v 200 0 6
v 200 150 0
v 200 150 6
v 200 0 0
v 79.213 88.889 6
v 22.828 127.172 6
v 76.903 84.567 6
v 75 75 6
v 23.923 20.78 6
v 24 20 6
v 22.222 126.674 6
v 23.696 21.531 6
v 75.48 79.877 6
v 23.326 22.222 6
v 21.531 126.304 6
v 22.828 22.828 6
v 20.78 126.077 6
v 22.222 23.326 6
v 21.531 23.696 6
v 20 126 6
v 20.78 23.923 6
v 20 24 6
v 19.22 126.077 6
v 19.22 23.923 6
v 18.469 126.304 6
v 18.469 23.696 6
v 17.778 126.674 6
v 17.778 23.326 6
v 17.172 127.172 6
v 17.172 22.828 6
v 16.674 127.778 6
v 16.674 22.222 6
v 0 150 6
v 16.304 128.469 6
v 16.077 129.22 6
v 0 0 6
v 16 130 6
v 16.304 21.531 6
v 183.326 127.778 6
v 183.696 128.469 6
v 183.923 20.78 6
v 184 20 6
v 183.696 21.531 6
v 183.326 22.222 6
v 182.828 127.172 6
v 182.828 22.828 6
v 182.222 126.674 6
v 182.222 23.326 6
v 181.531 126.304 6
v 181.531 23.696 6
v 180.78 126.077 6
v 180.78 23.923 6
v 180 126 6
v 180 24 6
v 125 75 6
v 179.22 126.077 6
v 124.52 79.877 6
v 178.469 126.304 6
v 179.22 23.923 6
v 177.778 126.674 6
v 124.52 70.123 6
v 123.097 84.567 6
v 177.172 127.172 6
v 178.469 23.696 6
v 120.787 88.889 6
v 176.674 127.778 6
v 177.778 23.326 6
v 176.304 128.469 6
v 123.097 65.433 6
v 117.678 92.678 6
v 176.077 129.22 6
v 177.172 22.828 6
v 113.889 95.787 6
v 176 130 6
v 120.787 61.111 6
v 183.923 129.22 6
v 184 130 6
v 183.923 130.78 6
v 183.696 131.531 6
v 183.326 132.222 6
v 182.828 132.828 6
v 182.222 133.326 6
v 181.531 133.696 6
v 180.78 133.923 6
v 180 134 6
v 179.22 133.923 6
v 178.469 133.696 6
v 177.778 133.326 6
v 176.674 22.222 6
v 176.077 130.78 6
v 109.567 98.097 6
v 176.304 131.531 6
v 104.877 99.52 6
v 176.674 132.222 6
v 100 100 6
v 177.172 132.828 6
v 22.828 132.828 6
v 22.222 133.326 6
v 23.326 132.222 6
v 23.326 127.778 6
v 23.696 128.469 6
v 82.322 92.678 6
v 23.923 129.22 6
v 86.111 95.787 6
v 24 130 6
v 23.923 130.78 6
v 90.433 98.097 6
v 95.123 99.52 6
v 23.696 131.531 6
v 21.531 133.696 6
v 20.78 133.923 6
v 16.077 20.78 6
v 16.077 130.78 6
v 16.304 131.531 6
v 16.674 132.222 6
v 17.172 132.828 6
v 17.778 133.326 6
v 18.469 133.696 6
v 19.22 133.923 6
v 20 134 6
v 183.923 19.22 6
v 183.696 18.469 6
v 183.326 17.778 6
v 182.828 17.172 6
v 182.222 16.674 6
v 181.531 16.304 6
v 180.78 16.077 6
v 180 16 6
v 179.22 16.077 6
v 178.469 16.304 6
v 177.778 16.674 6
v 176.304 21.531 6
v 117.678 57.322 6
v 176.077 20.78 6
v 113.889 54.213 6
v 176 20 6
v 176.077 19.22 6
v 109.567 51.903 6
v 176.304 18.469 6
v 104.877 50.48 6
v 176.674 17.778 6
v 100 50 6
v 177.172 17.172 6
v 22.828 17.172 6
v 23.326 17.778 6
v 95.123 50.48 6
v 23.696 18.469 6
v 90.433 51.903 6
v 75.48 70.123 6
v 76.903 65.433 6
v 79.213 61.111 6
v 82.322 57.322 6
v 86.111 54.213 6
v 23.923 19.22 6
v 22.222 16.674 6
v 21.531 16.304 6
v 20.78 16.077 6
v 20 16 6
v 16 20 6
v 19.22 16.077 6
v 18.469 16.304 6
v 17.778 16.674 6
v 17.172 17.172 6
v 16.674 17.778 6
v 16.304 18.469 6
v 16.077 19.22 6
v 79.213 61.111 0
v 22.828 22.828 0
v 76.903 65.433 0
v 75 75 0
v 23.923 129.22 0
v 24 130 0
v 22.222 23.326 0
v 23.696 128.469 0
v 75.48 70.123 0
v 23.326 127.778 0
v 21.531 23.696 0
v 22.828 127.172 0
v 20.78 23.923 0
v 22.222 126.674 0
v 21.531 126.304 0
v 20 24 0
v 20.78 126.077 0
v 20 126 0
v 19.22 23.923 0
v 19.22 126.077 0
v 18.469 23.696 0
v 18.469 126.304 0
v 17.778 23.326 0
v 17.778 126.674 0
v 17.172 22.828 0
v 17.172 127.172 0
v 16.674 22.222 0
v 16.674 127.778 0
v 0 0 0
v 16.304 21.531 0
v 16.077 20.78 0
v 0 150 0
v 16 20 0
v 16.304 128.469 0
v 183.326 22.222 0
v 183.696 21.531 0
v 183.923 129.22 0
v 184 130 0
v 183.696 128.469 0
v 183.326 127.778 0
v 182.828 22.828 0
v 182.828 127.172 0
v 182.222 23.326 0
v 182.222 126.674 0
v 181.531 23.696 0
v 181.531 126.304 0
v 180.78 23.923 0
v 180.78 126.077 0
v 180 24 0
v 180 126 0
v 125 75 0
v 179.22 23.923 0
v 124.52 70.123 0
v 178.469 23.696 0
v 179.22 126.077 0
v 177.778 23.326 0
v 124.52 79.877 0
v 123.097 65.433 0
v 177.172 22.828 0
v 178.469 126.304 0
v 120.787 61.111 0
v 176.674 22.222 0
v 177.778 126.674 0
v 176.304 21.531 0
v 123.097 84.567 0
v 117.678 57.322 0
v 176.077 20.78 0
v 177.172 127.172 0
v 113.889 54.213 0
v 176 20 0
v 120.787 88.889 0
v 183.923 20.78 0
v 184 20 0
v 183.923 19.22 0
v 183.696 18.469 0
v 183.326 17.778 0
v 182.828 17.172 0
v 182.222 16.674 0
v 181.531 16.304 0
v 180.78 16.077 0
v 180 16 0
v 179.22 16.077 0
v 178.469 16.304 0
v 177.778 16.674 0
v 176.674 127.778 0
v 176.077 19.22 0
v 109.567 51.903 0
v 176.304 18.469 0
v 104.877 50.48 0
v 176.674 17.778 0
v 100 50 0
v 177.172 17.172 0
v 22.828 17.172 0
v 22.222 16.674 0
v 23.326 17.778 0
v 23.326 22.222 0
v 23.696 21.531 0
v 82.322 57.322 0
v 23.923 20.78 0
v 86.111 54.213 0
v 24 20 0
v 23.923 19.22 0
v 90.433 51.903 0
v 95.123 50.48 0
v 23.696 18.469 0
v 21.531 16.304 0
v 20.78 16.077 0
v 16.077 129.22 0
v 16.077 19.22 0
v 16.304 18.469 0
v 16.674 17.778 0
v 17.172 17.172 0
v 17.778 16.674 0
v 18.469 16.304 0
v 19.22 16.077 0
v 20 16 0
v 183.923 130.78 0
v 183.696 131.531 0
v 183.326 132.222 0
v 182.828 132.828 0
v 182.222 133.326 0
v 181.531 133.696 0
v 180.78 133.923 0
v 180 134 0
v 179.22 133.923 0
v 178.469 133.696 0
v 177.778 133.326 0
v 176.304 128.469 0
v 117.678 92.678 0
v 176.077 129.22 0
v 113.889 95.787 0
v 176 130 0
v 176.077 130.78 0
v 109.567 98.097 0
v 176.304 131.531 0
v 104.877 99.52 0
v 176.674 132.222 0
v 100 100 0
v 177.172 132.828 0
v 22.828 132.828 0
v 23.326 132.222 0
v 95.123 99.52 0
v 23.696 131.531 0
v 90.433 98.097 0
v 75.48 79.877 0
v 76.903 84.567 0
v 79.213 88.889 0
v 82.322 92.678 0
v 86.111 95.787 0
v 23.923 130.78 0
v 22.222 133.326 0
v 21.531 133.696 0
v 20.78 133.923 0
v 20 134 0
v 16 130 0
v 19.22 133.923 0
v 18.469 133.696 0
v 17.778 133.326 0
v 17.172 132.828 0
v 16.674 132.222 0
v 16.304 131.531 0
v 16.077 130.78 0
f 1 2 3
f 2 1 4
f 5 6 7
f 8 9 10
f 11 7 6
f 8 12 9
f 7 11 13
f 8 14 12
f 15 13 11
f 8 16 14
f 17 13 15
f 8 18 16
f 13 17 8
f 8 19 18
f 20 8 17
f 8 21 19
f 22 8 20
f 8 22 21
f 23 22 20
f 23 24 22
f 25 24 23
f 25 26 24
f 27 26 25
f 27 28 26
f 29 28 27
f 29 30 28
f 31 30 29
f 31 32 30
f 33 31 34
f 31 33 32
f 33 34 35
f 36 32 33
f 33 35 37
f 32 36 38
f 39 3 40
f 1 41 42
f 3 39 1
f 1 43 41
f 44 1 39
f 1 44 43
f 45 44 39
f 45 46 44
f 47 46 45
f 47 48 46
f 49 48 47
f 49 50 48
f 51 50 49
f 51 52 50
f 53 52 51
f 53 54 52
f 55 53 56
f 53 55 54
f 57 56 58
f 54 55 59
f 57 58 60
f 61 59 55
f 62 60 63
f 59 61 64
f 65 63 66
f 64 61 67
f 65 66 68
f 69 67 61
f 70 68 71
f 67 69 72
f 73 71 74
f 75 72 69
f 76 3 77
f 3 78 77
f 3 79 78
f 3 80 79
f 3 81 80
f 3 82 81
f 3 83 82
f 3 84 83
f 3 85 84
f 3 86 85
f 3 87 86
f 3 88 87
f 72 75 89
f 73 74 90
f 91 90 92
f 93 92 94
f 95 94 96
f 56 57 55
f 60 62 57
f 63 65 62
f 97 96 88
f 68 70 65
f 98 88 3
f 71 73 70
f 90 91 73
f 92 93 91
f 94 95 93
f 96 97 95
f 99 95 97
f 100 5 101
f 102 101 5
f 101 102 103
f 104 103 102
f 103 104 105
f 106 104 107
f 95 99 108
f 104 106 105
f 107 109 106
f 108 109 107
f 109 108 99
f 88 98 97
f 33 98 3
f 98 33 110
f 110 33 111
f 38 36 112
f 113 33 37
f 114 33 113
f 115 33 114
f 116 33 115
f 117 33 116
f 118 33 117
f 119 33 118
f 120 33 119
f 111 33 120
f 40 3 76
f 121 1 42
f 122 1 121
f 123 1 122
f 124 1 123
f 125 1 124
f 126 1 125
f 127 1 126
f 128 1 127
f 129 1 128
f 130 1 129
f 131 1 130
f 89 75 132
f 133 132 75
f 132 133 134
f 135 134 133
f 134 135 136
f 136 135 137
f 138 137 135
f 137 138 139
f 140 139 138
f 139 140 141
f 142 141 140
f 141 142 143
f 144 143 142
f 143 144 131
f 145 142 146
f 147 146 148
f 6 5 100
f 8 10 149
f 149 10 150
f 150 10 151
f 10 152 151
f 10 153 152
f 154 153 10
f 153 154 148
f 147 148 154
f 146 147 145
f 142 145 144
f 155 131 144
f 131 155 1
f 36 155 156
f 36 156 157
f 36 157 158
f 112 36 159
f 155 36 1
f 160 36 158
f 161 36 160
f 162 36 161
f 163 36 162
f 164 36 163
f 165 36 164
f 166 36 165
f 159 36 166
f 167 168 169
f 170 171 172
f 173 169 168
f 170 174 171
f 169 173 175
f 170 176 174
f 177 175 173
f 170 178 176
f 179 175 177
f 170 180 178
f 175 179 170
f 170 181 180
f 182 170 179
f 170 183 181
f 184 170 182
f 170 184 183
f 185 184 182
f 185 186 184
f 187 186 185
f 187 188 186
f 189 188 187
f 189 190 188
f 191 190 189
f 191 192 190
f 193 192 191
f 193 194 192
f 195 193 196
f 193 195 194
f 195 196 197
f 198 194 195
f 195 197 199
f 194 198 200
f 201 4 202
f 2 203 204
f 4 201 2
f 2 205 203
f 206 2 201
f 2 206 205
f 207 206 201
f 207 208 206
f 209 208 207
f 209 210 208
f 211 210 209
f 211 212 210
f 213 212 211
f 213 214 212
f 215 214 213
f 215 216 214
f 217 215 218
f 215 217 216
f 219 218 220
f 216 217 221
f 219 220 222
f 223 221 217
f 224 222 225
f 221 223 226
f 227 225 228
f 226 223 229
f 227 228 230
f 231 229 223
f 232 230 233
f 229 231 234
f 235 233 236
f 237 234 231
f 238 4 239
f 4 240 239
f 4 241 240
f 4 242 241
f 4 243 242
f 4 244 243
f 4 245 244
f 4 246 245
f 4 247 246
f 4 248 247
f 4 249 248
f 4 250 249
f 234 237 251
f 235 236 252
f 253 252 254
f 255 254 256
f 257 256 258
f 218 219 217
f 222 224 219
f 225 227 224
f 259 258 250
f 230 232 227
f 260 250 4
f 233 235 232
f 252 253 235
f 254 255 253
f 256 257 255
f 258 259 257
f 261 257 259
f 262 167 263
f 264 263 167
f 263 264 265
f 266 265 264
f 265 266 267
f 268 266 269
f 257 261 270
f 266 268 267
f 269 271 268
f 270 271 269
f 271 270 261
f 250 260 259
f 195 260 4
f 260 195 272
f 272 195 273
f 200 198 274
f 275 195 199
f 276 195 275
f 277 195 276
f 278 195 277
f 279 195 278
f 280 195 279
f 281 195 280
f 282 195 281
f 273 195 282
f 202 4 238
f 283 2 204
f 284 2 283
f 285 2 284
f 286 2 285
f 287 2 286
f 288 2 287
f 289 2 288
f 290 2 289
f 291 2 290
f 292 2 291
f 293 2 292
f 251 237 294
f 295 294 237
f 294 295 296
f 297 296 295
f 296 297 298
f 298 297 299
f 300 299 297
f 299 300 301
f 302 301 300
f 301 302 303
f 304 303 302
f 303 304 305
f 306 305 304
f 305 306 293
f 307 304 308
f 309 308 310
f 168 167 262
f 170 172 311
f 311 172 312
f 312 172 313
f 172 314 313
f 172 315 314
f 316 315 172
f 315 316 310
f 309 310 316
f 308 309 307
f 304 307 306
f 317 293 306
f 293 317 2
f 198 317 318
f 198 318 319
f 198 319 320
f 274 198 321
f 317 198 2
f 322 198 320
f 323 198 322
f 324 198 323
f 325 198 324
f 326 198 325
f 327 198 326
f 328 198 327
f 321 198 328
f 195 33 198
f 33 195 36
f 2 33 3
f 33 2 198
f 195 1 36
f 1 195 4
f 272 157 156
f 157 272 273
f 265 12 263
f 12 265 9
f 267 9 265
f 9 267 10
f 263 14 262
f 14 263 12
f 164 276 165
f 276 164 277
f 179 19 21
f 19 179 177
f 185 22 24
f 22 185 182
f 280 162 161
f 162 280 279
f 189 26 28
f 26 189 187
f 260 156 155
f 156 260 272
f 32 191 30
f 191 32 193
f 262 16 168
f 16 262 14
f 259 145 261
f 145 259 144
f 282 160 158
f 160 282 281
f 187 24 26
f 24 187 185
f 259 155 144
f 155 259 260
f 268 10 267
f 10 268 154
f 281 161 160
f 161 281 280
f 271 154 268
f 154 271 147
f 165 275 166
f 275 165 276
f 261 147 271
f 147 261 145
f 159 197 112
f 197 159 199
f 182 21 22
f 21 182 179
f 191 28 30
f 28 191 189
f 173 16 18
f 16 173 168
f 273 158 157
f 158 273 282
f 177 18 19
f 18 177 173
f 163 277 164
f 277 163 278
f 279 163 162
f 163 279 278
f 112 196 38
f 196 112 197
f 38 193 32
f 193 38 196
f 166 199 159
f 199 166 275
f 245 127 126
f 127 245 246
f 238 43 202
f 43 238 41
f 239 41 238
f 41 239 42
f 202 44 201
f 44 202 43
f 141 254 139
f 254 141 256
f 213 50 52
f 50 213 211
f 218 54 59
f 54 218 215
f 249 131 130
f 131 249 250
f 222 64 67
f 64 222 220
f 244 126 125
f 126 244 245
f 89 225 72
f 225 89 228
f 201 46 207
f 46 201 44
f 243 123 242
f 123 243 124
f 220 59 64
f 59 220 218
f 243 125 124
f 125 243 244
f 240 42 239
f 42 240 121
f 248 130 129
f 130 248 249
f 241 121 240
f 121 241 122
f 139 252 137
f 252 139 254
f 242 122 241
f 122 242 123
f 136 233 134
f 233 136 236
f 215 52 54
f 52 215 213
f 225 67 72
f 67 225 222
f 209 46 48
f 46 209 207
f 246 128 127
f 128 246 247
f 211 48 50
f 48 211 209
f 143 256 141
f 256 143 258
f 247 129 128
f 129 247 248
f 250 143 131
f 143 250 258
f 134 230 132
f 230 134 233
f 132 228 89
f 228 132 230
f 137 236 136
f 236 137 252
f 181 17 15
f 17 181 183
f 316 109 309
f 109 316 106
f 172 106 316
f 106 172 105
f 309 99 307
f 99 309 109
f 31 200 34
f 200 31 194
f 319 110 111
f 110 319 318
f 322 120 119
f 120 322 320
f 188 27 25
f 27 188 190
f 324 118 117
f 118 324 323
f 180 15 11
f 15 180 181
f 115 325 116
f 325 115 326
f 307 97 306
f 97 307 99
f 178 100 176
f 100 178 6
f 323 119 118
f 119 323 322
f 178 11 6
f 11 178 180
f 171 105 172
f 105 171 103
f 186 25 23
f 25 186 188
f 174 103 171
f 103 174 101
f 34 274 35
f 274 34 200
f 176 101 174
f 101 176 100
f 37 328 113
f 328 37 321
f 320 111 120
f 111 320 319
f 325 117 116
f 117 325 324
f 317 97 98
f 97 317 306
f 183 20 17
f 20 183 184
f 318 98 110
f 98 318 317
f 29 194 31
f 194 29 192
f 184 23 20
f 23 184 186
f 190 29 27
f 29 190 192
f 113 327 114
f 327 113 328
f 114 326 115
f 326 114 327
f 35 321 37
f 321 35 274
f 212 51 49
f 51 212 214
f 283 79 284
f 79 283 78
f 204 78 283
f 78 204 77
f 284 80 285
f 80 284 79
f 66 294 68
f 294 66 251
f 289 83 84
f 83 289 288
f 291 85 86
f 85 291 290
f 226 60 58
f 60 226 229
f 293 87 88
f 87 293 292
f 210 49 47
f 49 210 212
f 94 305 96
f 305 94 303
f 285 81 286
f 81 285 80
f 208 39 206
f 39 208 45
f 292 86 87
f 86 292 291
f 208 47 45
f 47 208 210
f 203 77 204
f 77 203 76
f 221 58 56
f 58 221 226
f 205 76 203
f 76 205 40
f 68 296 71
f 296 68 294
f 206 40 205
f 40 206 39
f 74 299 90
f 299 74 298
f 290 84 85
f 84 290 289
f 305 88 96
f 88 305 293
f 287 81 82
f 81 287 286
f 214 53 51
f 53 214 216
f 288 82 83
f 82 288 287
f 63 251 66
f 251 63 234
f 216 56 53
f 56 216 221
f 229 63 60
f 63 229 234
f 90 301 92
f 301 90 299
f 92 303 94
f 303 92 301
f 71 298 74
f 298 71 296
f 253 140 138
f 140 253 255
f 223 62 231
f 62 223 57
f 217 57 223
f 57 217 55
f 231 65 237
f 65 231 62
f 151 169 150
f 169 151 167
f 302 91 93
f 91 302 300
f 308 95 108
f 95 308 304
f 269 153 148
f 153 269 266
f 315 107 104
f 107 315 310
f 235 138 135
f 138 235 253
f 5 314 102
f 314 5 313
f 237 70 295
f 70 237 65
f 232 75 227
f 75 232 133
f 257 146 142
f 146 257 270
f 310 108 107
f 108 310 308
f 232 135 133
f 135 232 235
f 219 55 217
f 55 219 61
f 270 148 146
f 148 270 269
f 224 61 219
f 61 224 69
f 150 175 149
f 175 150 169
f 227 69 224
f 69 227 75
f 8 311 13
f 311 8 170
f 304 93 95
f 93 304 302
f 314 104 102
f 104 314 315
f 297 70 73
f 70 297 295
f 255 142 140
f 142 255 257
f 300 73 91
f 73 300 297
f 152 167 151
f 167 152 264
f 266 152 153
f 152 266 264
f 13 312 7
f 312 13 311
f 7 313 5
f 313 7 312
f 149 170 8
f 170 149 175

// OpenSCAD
$fn = 32;

// ----------------------------------------------------------------------
// Big plate: 200-250 mm adapter plate
// ----------------------------------------------------------------------

// --- parameters (mm) ---
plate_l = 200;            // plate length, X
plate_w = 150;            // plate width, Y
plate_t = 6;              // plate thickness, Z
corner_d = 8;             // corner hole diameter
corner_in = 20;           // corner hole inset from the edges
bore_d = 50;              // central bore
fit_tol = 0.05;           // tolerance for press fits, mm
free_tol = 0.2;           // tolerance for clearance fits, mm

difference() {
  cube([plate_l, plate_w, plate_t]);
  translate([corner_in, corner_in, -1]) cylinder(h = plate_t + 2, d = corner_d);
  translate([plate_l - corner_in, corner_in, -1]) cylinder(h = plate_t + 2, d = corner_d);
  translate([corner_in, plate_w - corner_in, -1]) cylinder(h = plate_t + 2, d = corner_d);
  translate([plate_l - corner_in, plate_w - corner_in, -1]) cylinder(h = plate_t + 2, d = corner_d);
  translate([plate_l / 2, plate_w / 2, -1]) cylinder(h = plate_t + 2, d = bore_d);
}
